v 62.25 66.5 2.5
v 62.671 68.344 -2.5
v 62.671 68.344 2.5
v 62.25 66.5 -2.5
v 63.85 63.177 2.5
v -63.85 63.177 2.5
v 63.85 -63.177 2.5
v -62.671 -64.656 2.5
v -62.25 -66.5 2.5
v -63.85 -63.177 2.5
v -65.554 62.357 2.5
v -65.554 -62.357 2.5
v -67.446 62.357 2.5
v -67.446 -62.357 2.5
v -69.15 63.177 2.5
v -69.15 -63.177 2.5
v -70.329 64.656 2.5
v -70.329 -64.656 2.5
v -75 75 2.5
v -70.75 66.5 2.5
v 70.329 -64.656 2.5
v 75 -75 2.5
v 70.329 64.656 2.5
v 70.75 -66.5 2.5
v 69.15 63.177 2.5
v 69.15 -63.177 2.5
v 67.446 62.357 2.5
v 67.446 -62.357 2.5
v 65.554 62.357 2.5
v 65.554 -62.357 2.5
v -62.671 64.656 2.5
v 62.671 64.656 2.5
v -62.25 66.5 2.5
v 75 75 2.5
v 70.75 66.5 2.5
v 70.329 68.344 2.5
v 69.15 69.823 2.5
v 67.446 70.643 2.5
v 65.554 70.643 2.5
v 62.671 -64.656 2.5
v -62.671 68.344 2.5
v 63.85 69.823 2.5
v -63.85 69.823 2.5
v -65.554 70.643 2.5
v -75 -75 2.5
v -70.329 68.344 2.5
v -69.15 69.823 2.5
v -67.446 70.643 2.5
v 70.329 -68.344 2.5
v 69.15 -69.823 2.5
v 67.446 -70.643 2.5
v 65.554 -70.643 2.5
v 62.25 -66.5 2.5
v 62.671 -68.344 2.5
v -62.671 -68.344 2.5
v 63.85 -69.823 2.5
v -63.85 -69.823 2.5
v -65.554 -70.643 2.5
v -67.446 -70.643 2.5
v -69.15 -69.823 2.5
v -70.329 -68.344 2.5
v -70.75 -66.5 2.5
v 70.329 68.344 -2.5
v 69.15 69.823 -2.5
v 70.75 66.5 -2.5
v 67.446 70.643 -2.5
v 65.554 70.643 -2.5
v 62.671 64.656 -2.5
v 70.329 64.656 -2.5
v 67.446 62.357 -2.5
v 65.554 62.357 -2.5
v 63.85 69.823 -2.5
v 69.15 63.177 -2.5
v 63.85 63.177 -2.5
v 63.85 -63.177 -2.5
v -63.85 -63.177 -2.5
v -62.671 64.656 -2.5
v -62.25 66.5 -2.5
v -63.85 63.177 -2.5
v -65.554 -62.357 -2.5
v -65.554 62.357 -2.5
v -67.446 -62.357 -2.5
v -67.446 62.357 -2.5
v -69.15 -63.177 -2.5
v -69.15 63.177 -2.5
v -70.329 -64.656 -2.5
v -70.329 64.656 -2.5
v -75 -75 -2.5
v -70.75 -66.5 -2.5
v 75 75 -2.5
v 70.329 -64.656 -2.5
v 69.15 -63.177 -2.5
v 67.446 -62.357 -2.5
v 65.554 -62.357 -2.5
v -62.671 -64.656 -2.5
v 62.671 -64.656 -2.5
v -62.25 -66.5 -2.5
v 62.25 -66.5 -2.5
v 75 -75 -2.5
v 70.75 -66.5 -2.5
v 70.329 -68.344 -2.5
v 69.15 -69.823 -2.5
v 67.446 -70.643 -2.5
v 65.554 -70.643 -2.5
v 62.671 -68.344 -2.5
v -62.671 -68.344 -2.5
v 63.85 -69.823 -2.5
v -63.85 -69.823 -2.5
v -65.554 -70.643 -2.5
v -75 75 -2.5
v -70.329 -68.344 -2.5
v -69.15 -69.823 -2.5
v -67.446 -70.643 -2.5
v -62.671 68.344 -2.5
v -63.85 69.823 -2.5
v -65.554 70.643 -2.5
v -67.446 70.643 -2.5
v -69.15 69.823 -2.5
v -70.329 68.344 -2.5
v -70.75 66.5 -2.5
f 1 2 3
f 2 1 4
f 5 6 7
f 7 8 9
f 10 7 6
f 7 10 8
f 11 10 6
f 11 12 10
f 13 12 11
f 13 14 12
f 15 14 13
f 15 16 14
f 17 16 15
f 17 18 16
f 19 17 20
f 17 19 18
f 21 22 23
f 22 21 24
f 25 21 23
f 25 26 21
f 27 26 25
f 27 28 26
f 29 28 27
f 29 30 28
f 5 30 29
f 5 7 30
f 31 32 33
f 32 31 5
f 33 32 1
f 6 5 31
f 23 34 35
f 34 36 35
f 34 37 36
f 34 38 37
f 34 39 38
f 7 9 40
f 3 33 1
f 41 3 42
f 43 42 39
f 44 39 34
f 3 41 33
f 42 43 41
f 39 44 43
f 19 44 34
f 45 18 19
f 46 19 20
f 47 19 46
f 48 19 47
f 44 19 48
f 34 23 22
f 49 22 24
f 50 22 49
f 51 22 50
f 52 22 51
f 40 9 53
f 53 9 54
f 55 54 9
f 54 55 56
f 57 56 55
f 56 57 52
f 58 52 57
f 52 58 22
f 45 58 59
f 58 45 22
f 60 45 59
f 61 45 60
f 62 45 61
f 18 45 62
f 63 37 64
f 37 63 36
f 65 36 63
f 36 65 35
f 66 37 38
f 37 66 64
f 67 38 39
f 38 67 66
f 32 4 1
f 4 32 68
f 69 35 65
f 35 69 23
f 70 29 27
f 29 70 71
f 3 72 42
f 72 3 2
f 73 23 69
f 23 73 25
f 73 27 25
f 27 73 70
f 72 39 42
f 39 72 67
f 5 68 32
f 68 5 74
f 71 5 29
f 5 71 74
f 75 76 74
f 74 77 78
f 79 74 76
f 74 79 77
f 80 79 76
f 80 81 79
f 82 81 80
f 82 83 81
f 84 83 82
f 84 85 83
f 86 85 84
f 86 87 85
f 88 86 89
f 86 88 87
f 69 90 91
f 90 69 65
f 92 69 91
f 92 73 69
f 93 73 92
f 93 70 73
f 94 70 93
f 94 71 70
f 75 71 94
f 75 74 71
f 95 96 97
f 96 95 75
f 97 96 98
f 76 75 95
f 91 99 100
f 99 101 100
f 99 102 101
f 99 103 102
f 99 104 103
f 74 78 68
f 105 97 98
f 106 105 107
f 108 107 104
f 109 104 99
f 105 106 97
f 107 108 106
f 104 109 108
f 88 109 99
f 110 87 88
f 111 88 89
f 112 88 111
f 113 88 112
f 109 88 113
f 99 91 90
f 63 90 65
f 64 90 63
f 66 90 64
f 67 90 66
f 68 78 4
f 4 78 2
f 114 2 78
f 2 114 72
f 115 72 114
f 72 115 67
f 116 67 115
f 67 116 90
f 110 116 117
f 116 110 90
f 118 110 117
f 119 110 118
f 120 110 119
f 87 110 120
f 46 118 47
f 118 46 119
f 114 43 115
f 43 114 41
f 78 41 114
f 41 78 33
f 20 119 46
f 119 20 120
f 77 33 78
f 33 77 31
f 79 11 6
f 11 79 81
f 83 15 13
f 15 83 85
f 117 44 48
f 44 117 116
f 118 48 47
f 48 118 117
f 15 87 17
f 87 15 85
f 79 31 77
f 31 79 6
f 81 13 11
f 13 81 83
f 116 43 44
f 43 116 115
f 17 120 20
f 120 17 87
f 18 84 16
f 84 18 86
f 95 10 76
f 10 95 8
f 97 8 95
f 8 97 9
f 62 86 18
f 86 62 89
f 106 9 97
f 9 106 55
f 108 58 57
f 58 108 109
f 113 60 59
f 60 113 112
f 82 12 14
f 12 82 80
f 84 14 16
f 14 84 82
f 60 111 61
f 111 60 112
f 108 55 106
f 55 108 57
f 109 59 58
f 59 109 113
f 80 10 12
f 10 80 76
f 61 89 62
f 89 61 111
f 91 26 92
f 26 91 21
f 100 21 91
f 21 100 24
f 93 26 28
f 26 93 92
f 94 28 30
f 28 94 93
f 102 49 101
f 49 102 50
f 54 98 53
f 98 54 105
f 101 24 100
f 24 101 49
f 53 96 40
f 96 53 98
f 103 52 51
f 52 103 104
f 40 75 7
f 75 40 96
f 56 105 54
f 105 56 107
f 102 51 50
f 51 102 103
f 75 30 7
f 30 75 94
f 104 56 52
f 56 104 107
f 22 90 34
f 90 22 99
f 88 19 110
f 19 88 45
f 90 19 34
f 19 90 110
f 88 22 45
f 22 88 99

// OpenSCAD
// Generated by SolidPython 1.1.3 on 2023-10-16 11:53:18


difference() {
	cube(center = true, size = [150, 150, 5]);
	union() {
		translate(v = [66.5000000000, 66.5000000000]) {
			cylinder(center = true, h = 5, r = 4.2500000000);
		}
		translate(v = [-66.5000000000, 66.5000000000]) {
			cylinder(center = true, h = 5, r = 4.2500000000);
		}
		translate(v = [-66.5000000000, -66.5000000000]) {
			cylinder(center = true, h = 5, r = 4.2500000000);
		}
		translate(v = [66.5000000000, -66.5000000000]) {
			cylinder(center = true, h = 5, r = 4.2500000000);
		}
	}
}
/***********************************************
*********      SolidPython code:      **********
************************************************
 
import solid
import numbers
import pudb
from solid.utils import *
import viewscad
import subprocess
import os
import os.path as osp
import math
import sys

chamfer_extrude=solid.import_scad("./chamfer_extrude.scad")
chamfer_extrude=chamfer_extrude.chamfer_extrude
r = viewscad.Renderer(width=800, height=800)

def debug(model,f_name,path="/home/ts/code/projects/mfd/designs/debug"):
    solid.scad_render_to_file(model,osp.join(path,f_name)+".scad")
#generate position list of wells using offset from center
wells_pos_from_center_4 = lambda offset: [[-offset,offset],
                                        [offset, offset],
                                        [-offset, -offset],
                                        [offset, -offset]]
#wells_pos_from_center_2 = lambda offset: [[0,offset],
#                                        [0, -offset]]
wells_pos_from_center_2 = lambda offset: [[offset,0],
                                        [-offset,0]]

def make_well(dims,shape=None,height=None,dxf=False):
    def circle_cylinder():
        if dxf or (height is None):
            well = solid.circle(r=dims, segments=64)
        else:
            well = solid.cylinder(r=dims, h=height, segments=64, center = True)
        return well
    if dims is None:
        sys.exit("radius needs to be a number")
    if isinstance(dims, numbers.Number):
        well =circle_cylinder()
    elif len(dims)==1:
        if isinstance(dims[1], numbers.Number):
            well =circle_cylinder()
        else:
            sys.exit("radius needs to be a number")
    elif len(dims)==2:
        well = solid.square(dims,center = True)
    elif len(dims)==3:
        well = solid.cube(dims, center = True)
    return well

def wells_top_bottom(center_gap,device_dims=None,shape=None,height=None, positions = None, dxf = False):
    well_shape = make_well(device_dims,shape=shape,height=height,dxf=dxf)
    wells = []
    if positions is None:
        offset = radius+radius/2.0
        positions = wells_pos_from_center_2(offset)
    if dxf or (height is None):
        height = 0
    for position in positions:
        if dxf:
            wells.append(solid.translate([position[0],position[1]])(well_shape))
        else:
            wells.append(solid.translate([position[0],position[1],height/2.0])(well_shape))
    return  union()(*wells)

#place wells in four corners 
def four_corner(radius,height=None, positions = None, dxf = False):
    #if well pos not specified set
    #to equally spaced by half radius
    if positions is None:
        offset = radius+radius/2.0
        positions = wells_pos_from_center_4(offset)
    if dxf or (height is None):
        height = 0
    #make wells at positions with specified radius and height
    wells = []
    for position in positions:
        #make circle if making dxf
        if dxf:
            well_shape = solid.circle(r=radius, segments=64)
            well_shape = solid.translate([position[0],position[1]])(well_shape)
        #if stl make cylinder
        else:
            well_shape = solid.cylinder(r=radius, h=height, segments=64, center = True)
            well_shape = solid.translate([position[0],position[1],height/2.0])(well_shape)
        wells.append(well_shape)
    return  union()(*wells)

#generate channels 
def make_channels(length,width,height=0,num_chans=1,max_chans=None,spacing=None, dxf = False,
                  rotate_channels=False):
    if dxf or (height is None):
        height = 0
    #if channel gap not defined, is equal to
    if spacing is None: spacing = width
    #calculate number of channels if fitting max num within given width
    if not max_chans is None:
        import math
        num_chans = math.floor((max_chans-spacing)/(width+spacing))
    #get total width of channel section  
    total_width = (width*num_chans)+(spacing*(num_chans-1))

    #make template channel
    #if rotate_channels: width, length = length, width
    if dxf:
        channel_t = solid.square([length,width],center = True)
    else:
        channel_t = solid.cube([length,width,height], center = True)

    #if number channels is even, offset the first channel to center its gap
    if num_chans % 2 == 0: centering = -(width/2.0+spacing/2.0)
    else: centering = 0
    #move template channel up to align bottom at z = 0 
    #and offset center if necessary
    if dxf:
        channel_t = solid.translate([0,centering])(channel_t)
    else:
        channel_t = solid.translate([0,centering,height/2.0])(channel_t)

    #if rotate_channels: length,width = width,length
    #start making the channels
    channels = []
    for i in range(num_chans):
        #if i=0 there is no translation
        #if i=1, we make the first channel adjacent to second
        direction = i

        #if i>=1, we add channels alternating left and right
        if i >= 1:
            direction = -(i/2.0)
            if i % 2 == 1: direction = (-direction)+0.5
                
        #make channel at right position and add it to channel list
        translation_coords = [0,direction*(width+spacing)]
        #if rotate_channels: translation_coords = [direction*(width+spacing),0]
        if dxf:
            channel = solid.translate(translation_coords)(channel_t)
        else:
            channel = solid.translate([*translation_coords,0])(channel_t)
        channels.append(channel)
    
    #group all channels as one object
    channels = union()(*channels)
    #compute the x,y,z dimensions in order to pass as arguments 
    #for construction of other parts of device (such as the chambers)
    measurements = {'x':(length/2.0,-length/2.0),
                    'y':(total_width/2.0,-total_width/2.0)}
    if not dxf:
        measurements['z'] = (height,0)
    if rotate_channels:
        channels = solid.rotate(90)(channels)
        measurements['x'],measurements['y']=measurements['y'],measurements['x']
    return channels,measurements

def make_chambers(msrs,height=None,extra=0,len_until=None,width=None, dxf = False):
    #computes x,y,z length
    total = lambda x : abs(x[0]) + abs(x[1])
    
    #if specific height if specified
    #otherwise use same height as channels
    if dxf:
        pass
    elif not height is None:
        msrs['z'] = (height,0)
    else:
        msrs['z'] = (0,0)
        
    #make copy of measurements from channels to modify chamber dimensions 
    #and add length to chambers as specified
    chamber_dims = msrs.copy()
    #calculate length of chamber to reach specified offset
    if not len_until is None:
        chamber_len = len_until-(msrs['x'][0])
    #or add specified length to channel length (if not specified, adds 0)
    else:
        chamber_len = msrs['x'][0]+extra
    #set the chamber length based 
    chamber_dims['x'] = (chamber_len/2.0,-(chamber_len/2.0))
    #compute final dimensions of chamber
    if not width is None:
        chamber_dims['y'] = (width/2.0,-width/2.0)
    chamber_dims = [total(size) for size in chamber_dims.values()]
        
    #calculate chamber translation offset to place adjacent to channels
    chamber_trslt = msrs['x'][0]+(chamber_len/2.0)
    #compute chamber translation coordinates to align with channels
    #x = 1 moves chamber above channels
    #x = -1 moves chamber below channels
    if dxf:
        trslt = lambda x : [x*(chamber_trslt),0]
    else:
        trslt = lambda x : [x*(chamber_trslt),0,msrs['z'][0]/2.0]
    
    #function to make chamber at top or at bottom 
    if dxf:
        move = lambda x : solid.translate(trslt(x))(solid.square(chamber_dims, center = True) )
    else:
        move = lambda x : solid.translate(trslt(x))(solid.cube(chamber_dims,center = True))
    #make top and bottom chambers and return them as grouped
    top = move(1)
    bottom = move(-1)
    #chambers=solid.rotate(90)(solid.union()(top,bottom))
    chambers=(solid.union()(top,bottom))

    return chambers

#create alignment features 
def alignment_features(unit,dims,grid_size, mask_size = None, alignment = "hollow", units_from_center = (2.5,2.5), corner_len=None):
    width = grid_size[0]*dims[0]
    length = grid_size[1]*dims[1]
    if mask_size is None and corner_len is None:
        corner_len = (dims[0] + dims[1]) /2 / 8
    corner = lambda thickness_div : solid.union()( solid.square([corner_len,corner_len/thickness_div],center=False), solid.square([corner_len/thickness_div,corner_len],center=False) )
    
    def make_full(thickness_div):
        thickness = corner_len/thickness_div
        tr = solid.translate([0, 0, 0 ])(solid.rotate(180)(corner(thickness_div)))
        tr = solid.translate([thickness/2,thickness/2,0])(tr)
        bl = solid.translate([0, 0, 0 ])(solid.rotate(0)(corner(thickness_div)))
        bl = solid.translate([-thickness/2,-thickness/2,0])(bl)
        return solid.union()(tr,bl)
    
    def make_hollow(thickness_div):
        thickness = corner_len/(thickness_div/2)
        inner = make_full(thickness_div)
        outer = make_full(thickness_div/2)
        hollow = outer - inner 
        return hollow
    
    center = (width /2 , length/2)
    mask_pos = lambda x,y : (center[0] + x*(float(units_from_center[0])*dims[0]), center[1] + y*(float(units_from_center[1])*dims[1]))
    positions = []
    positions.append(mask_pos(1,0))
    positions.append(mask_pos(0,1))
    positions.append(mask_pos(-1,0))
    positions.append(mask_pos(0,-1))
    make_mask = lambda mtype : make_hollow(8) if mtype == "hollow" else make_full(8)
    masks = [ solid.translate([*position,0])(make_mask(alignment)) for position in positions]
    
    solid.scad_render_to_file(solid.union()(*masks),"./designs/open_chamber/masks.scad")
    #return unit - solid.union()(*masks)
    return solid.union()(*masks,unit)

def create_outline(thickness, array, dims, grid_size,):
    width = grid_size[0]*dims[0] + thickness *2
    length = grid_size[1]*dims[1] + thickness *2
    outer = solid.translate([-thickness, -thickness,0])(solid.square([width, length]))
    return outer-array

def create_wall(wall_thickness, outline_thickness, dims, grid_size, wall_height = 2000, dxf = False):
    inner_width = grid_size[0]*dims[0] + outline_thickness *2
    inner_length = grid_size[1]*dims[1] + outline_thickness *2
    outer_width = inner_width + wall_thickness * 2
    outer_length = inner_length + wall_thickness * 2
    outer_pos_x = -outline_thickness-wall_thickness
    outer_pos_y = -outline_thickness-wall_thickness
    inner_pos_x = -outline_thickness
    inner_pos_y = -outline_thickness
    if dxf:
        inner_wall = solid.translate([inner_pos_x,
                                      inner_pos_y,
                                      0])(solid.square([inner_width, inner_length]))
        outer_wall = solid.translate([outer_pos_x,
                                      outer_pos_y,
                                      0])(solid.square([outer_width, outer_length]))

        return outer_wall-inner_wall
    else:
        inner_wall = solid.translate([inner_pos_x,
                                      inner_pos_y,
                                      0])(solid.cube([inner_width, inner_length,wall_height]))
        outer_wall = solid.translate([outer_pos_x,
                                      outer_pos_y,
                                      0])(solid.cube([outer_width, outer_length,wall_height]))

        return outer_wall-inner_wall, {'wall_height': wall_height,
                                       'wall_thickness': wall_thickness,
                                       'inner_width':inner_width,
                                       'inner_length': inner_length,
                                       'outer_width': outer_width,
                                       'outer_length': outer_length,
                                       'outer_pos_x' : outer_pos_x,
                                       'outer_pos_y' : outer_pos_y,
                                       'inner_pos_x' : inner_pos_x,
                                       'inner_pos_y' : inner_pos_y}

def create_thicker_wall(wall_thickness, outer_wall_offset, wall_dims, dims, grid_size, height_start = .2, height_end=2, dxf = False):
    addon_wall,thicker_wall_dims = create_wall(wall_thickness, outer_wall_offset, dims, grid_size, wall_height=height_end-height_start, dxf = False)
    addon_wall = solid.translate([0,0,height_start])(addon_wall)

    thicker_wall_dims['wall_height'] = height_end
    thicker_wall_dims['wall_thickness'] = wall_dims['wall_thickness'] + wall_thickness
    return addon_wall, thicker_wall_dims
 
def add_lock_to_wall(wall,wall_dims,y_offset = 0,cut_ratio=0.7,L_length=3, gap_ratio=0.05, axis="x",width_ratio=1/2):
    # Makes L shape
    def make_L(max_length,length_thickness,max_width,width_thickness,height,y_offset):
        length = solid.cube([max_length,length_thickness,height])
        width = solid.cube([width_thickness,max_width,height])
        width = solid.translate([max_length-(width_thickness),0,0])(width)
        L = solid.union()(width,length)
        debug(L,"L")
        if axis == "x":
            L = solid.rotate(-90)(L)
            L = solid.translate([0,max_length,0])(L)
        else:
            L = solid.rotate(-180)(L)
            L = solid.translate([max_length,max_width,0])(L)
        return solid.translate([0,0,y_offset])(L)
    
    lock_length = L_length
    lock_width = wall_dims['wall_thickness']*width_ratio
    lock_length_thickness = lock_width/2
    lock_width_thickness = lock_width/2
    L_lock = make_L(lock_length,lock_length_thickness,lock_width,lock_width_thickness, wall_dims['wall_height']-y_offset, y_offset)
    
    margin_space = lock_length - lock_length*(1-gap_ratio)
    key_length = lock_length-margin_space
    key_length_thickness = lock_length_thickness-(margin_space*2)
    key_width = lock_width-(margin_space*2)
    key_width_thickness = lock_width_thickness-(margin_space*2)
    L_key = make_L(key_length,key_length_thickness,key_width,key_width_thickness, wall_dims['wall_height']-y_offset, y_offset)
    L_key = solid.translate([margin_space,margin_space,0])(L_key)
    L = solid.union()(L_lock,L_key)
    debug(L,"L")
    
    #Make cube to be used as negative to split frame in a half
    #Can choose if making left or right negative, specify ratio of split
    def make_negative(right,cut_ratio):
        if axis == "x":
            if right:
                length = wall_dims['outer_length']*(1-cut_ratio)
                pos_x = wall_dims['outer_pos_x']+(wall_dims['outer_length']*cut_ratio)
            else:
                length = wall_dims['outer_length']*(cut_ratio)
                pos_x = wall_dims['outer_pos_x'] 
            negative = solid.cube([wall_dims['outer_width'],length, wall_dims['wall_height']])
            negative = solid.translate([wall_dims['outer_pos_y'],pos_x,0])(negative)
        else:
            if right:
                length = wall_dims['outer_width']*(1-cut_ratio)
                pos_x = wall_dims['outer_pos_y']+(wall_dims['outer_width']*cut_ratio)
            else:
                length = wall_dims['outer_width']*(cut_ratio)
                pos_x = wall_dims['outer_pos_y'] 
            negative = solid.cube([length,wall_dims['outer_length'], wall_dims['wall_height']])
            negative = solid.translate([pos_x,wall_dims['outer_pos_x'],0])(negative)
        return negative, pos_x, length 
                      
    #Make negatives
    negative_right, right_half_pos_x, right_half_length = make_negative(True,cut_ratio)
    negative_left, left_half_pos_x, right_half_length = make_negative(False,cut_ratio)
    #Make halves
    left_half = solid.difference()(wall,negative_right)
    right_half = solid.difference()(wall,negative_left)
    def place_L(L, L_length,L_width):
        #Place L on top wall       
        offset_to_center = (wall_dims['wall_thickness']-L_width)/2
        if axis == "x":
            y_pos_top = (wall_dims['outer_pos_y'] +
                    wall_dims['outer_width'] - 
                    L_width - offset_to_center)
            top_L = solid.translate([y_pos_top,
                                     right_half_pos_x-(L_length),
                                     0])(L)
            #Place L on bottom wall       
            y_pos_bottom = wall_dims['outer_pos_y']+offset_to_center
            bottom_L = solid.translate([y_pos_bottom,
                                        right_half_pos_x-L_length,
                                        0])(L)
        else:
            y_pos_top = (wall_dims['outer_pos_x'] +
                    wall_dims['outer_length'] -
                    (L_width+offset_to_center))
            top_L = solid.translate([right_half_pos_x-L_length,
                                     y_pos_top,
                                     0])(L)
            #Place L on bottom wall       
            y_pos_bottom = wall_dims['outer_pos_y']+offset_to_center
            bottom_L = solid.translate([right_half_pos_x-L_length,
                                        y_pos_bottom,
                                        0])(L)
        return bottom_L, top_L
    #Make complimentary L pieces through union and differences
    #Make Lock
    bottom_L_lock, top_L_lock = place_L(L_lock,L_length,lock_width)
    left_half = solid.difference()(left_half,bottom_L_lock)
    left_half = solid.difference()(left_half,top_L_lock)
    #Make Key
    bottom_L_key, top_L_key = place_L(L_key,L_length,lock_width)
    right_half = solid.union()(right_half,bottom_L_key)
    right_half = solid.union()(right_half,top_L_key)
    return left_half, right_half


#build a row x col grid of containment units
def make_unit_array(unit,dims,grid_size, dxf = False, alignment = None, mask_size = None,
                    units_from_center = None,alignment_offset=None, alignment_mark_size=1):
    units = []
    for col in range(grid_size[1]):
        for row in range(grid_size[0]):
            if dxf:
                units.append(solid.translate([row*dims[0],col*dims[1]])(unit))
            else:
                units.append(solid.translate([row*dims[0],col*dims[1],dims[2]/2.0])(unit))
    array = solid.union()(*units)
    if (not alignment is None) and dxf:
        if not alignment_offset is None:
            array = solid.translate([alignment_offset[0],alignment_offset[1]])(array)
        array = alignment_features(array,dims, grid_size, alignment = alignment, mask_size = None, units_from_center = units_from_center,corner_len=alignment_mark_size)
        if not alignment_offset is None:
            array = solid.translate([-alignment_offset[0],-alignment_offset[1]])(array)
    return array


def make_taylor(wells_pos = wells_pos_from_center_4(2.25), well_rad = 1.5 ,
                well_height = 2, chan_w = 0.01, chan_l = 1, chan_h = 0.010 ,
                chan_gap = 0.040, max_chans = None,num_chans=100, chamber_height  = 0.100,
                columns = 1, rows = 1, chamber_len_until=2.25, add_channels = True, add_wells = True, 
                add_chambers = True, save_path = "./", alignment = None, units_from_center = 2,
                mask_size = None, render_stl = False, outline_thickness = 0.050, dxf = True,
                wall_height = 15, wall_thickness = 0.95, casing_x=9, casing_y=9, casing_z=0,rotate_units=0):

    dims = [casing_x, casing_y, casing_z]
    wells = four_corner(well_rad,well_height, dxf = dxf, positions = wells_pos)
    debug(wells,"wells")
    channels, msrs = make_channels(chan_l,chan_w,chan_h,dxf=dxf, spacing = chan_gap, max_chans=max_chans,num_chans=num_chans)
    debug(channels,"channels")
    chambers = make_chambers(msrs,dxf = dxf, height=chamber_height,len_until=chamber_len_until)
    debug(chambers,"chambers")

    #add together and render
    device_parts = []
    if add_channels:
        device_parts.append(channels)
    if add_wells:
        device_parts.append(wells)
    if add_chambers:
        device_parts.append(chambers)
    device=union()(*device_parts)
    device = rotate(rotate_units)(device)

    device=solid.translate([dims[0]/2.0,dims[1]/2.0,0])(device)
    channels = rotate(rotate_units)(channels)
    channels=solid.translate([dims[0]/2,dims[1]/2,0])(channels)
    chambers_wells = union()(wells,chambers)
    chambers_wells = rotate(rotate_units)(chambers_wells)
    chambers_wells=solid.translate([dims[0]/2,dims[1]/2,0])(chambers_wells)

    file_name = str(rows)+'x'+str(columns)+'_units_'
    grid_size = [rows,columns]

    if alignment:
        alignment="full"
    device = make_unit_array(device,dims,grid_size, dxf=dxf, alignment = alignment,
                                 units_from_center = units_from_center)
    channels = make_unit_array(channels,dims,grid_size, dxf=dxf, alignment = alignment,
                                 units_from_center = units_from_center)
    if alignment=="full":
        alignment="hollow"

    chambers_wells = make_unit_array(chambers_wells,dims,grid_size, dxf=dxf, alignment = alignment,
                                 units_from_center =units_from_center)

    def save_model(model,prefix):
        model_fname = os.path.abspath(save_path+prefix+"_"+file_name+".scad")
        solid.scad_render_to_file(model,model_fname)
        return model_fname

    wells_fname = save_model(wells,"wells")
    channels_fname = save_model(channels,"channels")
    device_fname = save_model(device,"device")
    chambers_wells_fname = save_model(chambers_wells,"chambers_wells")
    return (chambers_wells,chambers_wells_fname), (channels,channels_fname), (device,device_fname)

def make_device(design='open',rows=8,columns=6,wells_pos = 4.5,well_offset=3.2, well_rad=3.2,well_height=0.1,
                chan_l=1,chan_w=0.01,chan_h=0.01,chan_gap=0.015,num_chans=101,dxf=True,save_path="./designs/open_chamber/",
                casing_x=9.0,casing_y=18.0,casing_z=0,rotate_units=90,units_from_center=(3,1),chamber_len_until=4.5,
                chamber_width=None,alignment=True, add_wells=True, add_channels=True,add_chambers=True):

    dims = [casing_x, casing_y, casing_z]
    if design == "open":
        wells_pos=wells_pos_from_center_2(wells_pos)
        wells = wells_top_bottom(well_offset*2,device_dims=well_rad,height=well_height, dxf = dxf, positions = wells_pos)
    elif design == "closed":
        wells_pos=wells_pos_from_center_4(wells_pos)
        debug(wells,"wells")
        wells = four_corner(well_offset,well_heightdevice_dims=well_rad, dxf = dxf, positions = wells_pos)
    else:
        print(design+" is not a valid design.\n Choose valid design: 'open' or 'closed'")
        exit()
    wells = rotate(rotate_units)(wells)
    wells=solid.translate([dims[0]/2,dims[1]/2,0])(wells)
    debug(wells,"wells")

    channels, msrs = make_channels(chan_l,chan_w,chan_h,dxf=dxf, spacing = chan_gap, num_chans=num_chans,rotate_channels=False)
    channels = rotate(rotate_units)(channels)
    channels=solid.translate([dims[0]/2,dims[1]/2,0])(channels)

    chambers=make_chambers(msrs,height=None,extra=0,len_until=chamber_len_until, width=chamber_width,dxf = dxf)
    chambers = rotate(rotate_units)(chambers)
    chambers=solid.translate([dims[0]/2,dims[1]/2,0])(chambers)

    device_parts = []
    if add_channels:
        device_parts.append(channels)
    if add_wells:
        device_parts.append(wells)
    if add_chambers:
        device_parts.append(chambers)
    device = union()(*device_parts)
    #device = rotate(rotate_units)(device)
    #device=solid.translate([dims[0]/2.0,dims[1]/2.0,0])(device)

    chambers_wells = []
    if add_chambers:
        chambers_wells.append(chambers)
    if add_wells:
        chambers_wells.append(wells)
    chambers_wells = union()(*chambers_wells)
    #chambers_wells = union()(wells,chambers)
    #chambers_wells = rotate(rotate_units)(chambers_wells)
    #chambers_wells=solid.translate([dims[0]/2,dims[1]/2,0])(chambers_wells)

    file_name = str(rows)+'x'+str(columns)+'_units_'

    grid_size = [rows,columns]
    if alignment:
        alignment="full"
    device = make_unit_array(device,dims,grid_size, dxf=dxf, alignment = alignment,
                                 units_from_center = units_from_center)
    channels = make_unit_array(channels,dims,grid_size, dxf=dxf, alignment = alignment,
                                 units_from_center = units_from_center)
    if alignment=="full":
        alignment="hollow"

    chambers_wells = make_unit_array(chambers_wells,dims,grid_size, dxf=dxf, alignment = alignment,
                                 units_from_center =units_from_center)

    def save_model(model,prefix):
        model_fname = os.path.abspath(save_path+prefix+"_"+file_name+".scad")
        solid.scad_render_to_file(model,model_fname)
        return model_fname

    wells_fname = save_model(wells,"wells")
    channels_fname = save_model(channels,"channels")
    device_fname = save_model(device,"device")
    chambers_wells_fname = save_model(chambers_wells,"chambers_wells")
    return (chambers_wells,chambers_wells_fname), (channels,channels_fname), (device,device_fname)


def make_open_chamber(rows=8,columns=6,wells_pos = wells_pos_from_center_2(4.5), well_rad=3.2,well_height=0.1,
                      chan_l=1,chan_w=0.01,chan_h=0.01,chan_gap=0.015,num_chans=101,dxf=True,save_path="./designs/open_chamber/",
                      casing_x=9.0,casing_y=18.0,casing_z=0,rotate_units=90,units_from_center=(3,1),chamber_len_until=4.5,
                      chamber_width=None,alignment=True, add_wells=True, add_channels=True,add_chambers=True):

    dims = [casing_x, casing_y, casing_z]
    wells = wells_top_bottom(well_rad,height=well_height, dxf = dxf, positions = wells_pos)
    channels, msrs = make_channels(chan_l,chan_w,chan_h,dxf=dxf, spacing = chan_gap, num_chans=num_chans,rotate_channels=False)
    chambers=make_chambers(msrs,height=None,extra=0,len_until=chamber_len_until, width=chamber_width,dxf = dxf)
    debug(chambers,"chambers")
    device_parts = []
    if add_channels:
        device_parts.append(channels)
    if add_wells:
        device_parts.append(wells)
    if add_chambers:
        device_parts.append(chambers)
    device = union()(*device_parts)
    device = rotate(rotate_units)(device)
    device=solid.translate([dims[0]/2.0,dims[1]/2.0,0])(device)
    channels = rotate(rotate_units)(channels)
    channels=solid.translate([dims[0]/2,dims[1]/2,0])(channels)
    chambers_wells = union()(wells,chambers)
    chambers_wells = rotate(rotate_units)(chambers_wells)
    chambers_wells=solid.translate([dims[0]/2,dims[1]/2,0])(chambers_wells)

    file_name = str(rows)+'x'+str(columns)+'_units_'

    grid_size = [rows,columns]
    if alignment:
        alignment="full"
    device = make_unit_array(device,dims,grid_size, dxf=dxf, alignment = alignment,
                                 units_from_center = units_from_center)
    channels = make_unit_array(channels,dims,grid_size, dxf=dxf, alignment = alignment,
                                 units_from_center = units_from_center)
    if alignment=="full":
        alignment="hollow"

    chambers_wells = make_unit_array(chambers_wells,dims,grid_size, dxf=dxf, alignment = alignment,
                                 units_from_center =units_from_center)

    def save_model(model,prefix):
        model_fname = os.path.abspath(save_path+prefix+"_"+file_name+".scad")
        solid.scad_render_to_file(model,model_fname)
        return model_fname

    wells_fname = save_model(wells,"wells")
    channels_fname = save_model(channels,"channels")
    device_fname = save_model(device,"device")
    chambers_wells_fname = save_model(chambers_wells,"chambers_wells")
    return (chambers_wells,chambers_wells_fname), (channels,channels_fname), (device,device_fname)

def to_dxf(scad_path):
    dxf_path = scad_path.replace(".scad",".dxf")
    subprocess.call(["openscad", "-o", dxf_path, scad_path])
    import ezdxf
    temp_dxf = ezdxf.readfile(dxf_path)
    temp_dxf.saveas(dxf_path)

#def make_walls(diameter,thickness,grid_size,dims,height=20,segments=256,make_inner=True):
#    wafer_wall_out = solid.cylinder(r=diameter/2,h=height, segments=segments)
#    wafer_wall_in = solid.cylinder(r=(diameter/2-thickness),h=height, segments=segments)
#    wafer_wall = solid.difference()(wafer_wall_out,wafer_wall_in)
#    wafer_wall = solid.translate([grid_size[1]*dims[1]/2.0,grid_size[0]*dims[0]/2.0])(wafer_wall)
#
#    vertical_wall_length = grid_size[1]*dims[1]
#    horizontal_wall_length = grid_size[0]*dims[0]
#    vertical_wall = solid.cube([vertical_wall_length,thickness,height],center = True)
#    vertical_wall = solid.translate([vertical_wall_length/2,0,height/2])(vertical_wall)
#    horizontal_wall = solid.cube([thickness,horizontal_wall_length,height],center = True)
#    horizontal_wall = solid.translate([0,vertical_wall_length/2,height/2])(horizontal_wall)
#    walls = []
#    walls.append(horizontal_wall)
#    walls.append(vertical_wall)
#    for col in range(grid_size[1]):
#        if col == grid_size[1]-1: 
#            walls.append(solid.translate([0,(col+1)*dims[1]])(vertical_wall))
#        elif col > 0 and col < grid_size[1]-1 and make_inner==True:
#            walls.append(solid.translate([0,(col+1)*dims[1]])(vertical_wall))
#    for row in range(grid_size[0]):
#        if row == grid_size[0]-1: 
#            walls.append(solid.translate([(row+1)*dims[0],0])(horizontal_wall))
#        elif row > 0 and row < grid_size[0]-1 and make_inner==True:
#            walls.append(solid.translate([(row+1)*dims[0],0])(horizontal_wall))
#    walls = union()(*walls)
#    wafer_walls = union()(walls,wafer_wall)
#    return walls,wafer_wall,wafer_walls

def make_walls(diameter,thickness,grid_size,dims,height=20,segments=256,make_inner=True,padx=0,pady=0):
    wafer_wall_out = solid.cylinder(r=diameter/2,h=height, segments=segments)
    wafer_wall_in = solid.cylinder(r=(diameter/2-thickness),h=height, segments=segments)
    wafer_wall = solid.difference()(wafer_wall_out,wafer_wall_in)
    wafer_wall = solid.translate([grid_size[1]*dims[1]/2.0,grid_size[0]*dims[0]/2.0])(wafer_wall)

    vertical_wall_length = grid_size[0]*dims[0]+padx
    horizontal_wall_length = grid_size[1]*dims[1]+pady
    vertical_wall = solid.cube([vertical_wall_length,thickness,height],center = True)
    vertical_wall = solid.translate([vertical_wall_length/2-pady/2,-padx/2,height/2])(vertical_wall)
    horizontal_wall = solid.cube([thickness,horizontal_wall_length,height],center = True)
    horizontal_wall = solid.translate([-pady/2,horizontal_wall_length/2-padx/2,height/2])(horizontal_wall)
    walls = []
    walls.append(horizontal_wall)
    walls.append(vertical_wall)
    for col in range(grid_size[1]):
        if col == grid_size[1]-1: 
            walls.append(solid.translate([0,(col+1)*dims[1]+pady])(vertical_wall))
        elif col > 0 and col < grid_size[1]-1 and make_inner==True:
            walls.append(solid.translate([0,(col+1)*dims[1]])(vertical_wall))
    for row in range(grid_size[0]):
        if row == grid_size[0]-1: 
            walls.append(solid.translate([(row+1)*dims[0]+padx,0])(horizontal_wall))
        elif row > 0 and row < grid_size[0]-1 and make_inner==True:
            walls.append(solid.translate([(row+1)*dims[0],0])(horizontal_wall))
    walls = union()(*walls)
    wafer_walls = union()(walls,wafer_wall)
    return walls,wafer_wall,wafer_walls

def save_model(model,base_path,base_name,dxf=True):
    if not os.path.exists(base_path):
        os.makedirs(base_path)
    dxf_path=osp.join(base_path,base_name+".scad")
    solid.scad_render_to_file(model,osp.join(dxf_path))
    if dxf:
        to_dxf(dxf_path)

def make_wafer(diameter,flat_len,thickness):
    wafer = solid.cylinder(r1=diameter/2,r2=diameter/2,h=thickness,segments=512,)()
    x_start_flat=(flat_len/2)
    y_start_flat = math.sqrt(((diameter/2)**2) - (x_start_flat**2) )
    height_delete_flat=diameter/2-y_start_flat
    flat_delete = solid.cube([flat_len,height_delete_flat,thickness],center=False)()
    flat_delete = solid.translate([-flat_len/2,y_start_flat,0])(flat_delete)
    wafer = solid.difference()(wafer,flat_delete)
    wafer = solid.rotate(90)(wafer)
    return wafer

def add_wafer_to_mask(wafer_size,flat_len,mask,grid_size,dims,wafer_line_thickness=0.1,outer_mask_thickness=5,alignment_offset=None):
    def make_wafer_mask(wafer_size,flat_len):
        wafer_mask = make_wafer(wafer_size,flat_len,1)
        wafer_mask = solid.projection()(wafer_mask)
        wafer_mask = solid.translate([grid_size[0]*dims[0]/2.0,grid_size[1]*dims[1]/2.0])(wafer_mask)
        if not alignment_offset is None:
            wafer_mask = solid.translate([-alignment_offset[0],-alignment_offset[1]])(wafer_mask)
        return wafer_mask

    inner_wafer_line_mask = make_wafer_mask(wafer_size-wafer_line_thickness/2,flat_len)
    outer_wafer_line_mask = make_wafer_mask(wafer_size+wafer_line_thickness/2,flat_len)
    outer_wafer_mask = make_wafer_mask(wafer_size+outer_mask_thickness,flat_len)
    outer_wafer_mask = solid.difference()(outer_wafer_mask,outer_wafer_line_mask)
    wafer_mask = solid.union()(outer_wafer_mask,inner_wafer_line_mask)

    return solid.difference()(wafer_mask,mask)

def make_posts(post_shape,post_height):
    posts = solid.linear_extrude(height=post_height)(post_shape)
    return posts

def make_wafer_empty(diameter,flat_len,thickness,margin,notch_len=20,notch_height=5,oversize=1.01):
    diameter*=oversize
    flat_len*=oversize
    wafer = make_wafer(diameter,flat_len,thickness)
    holder = solid.cylinder(r1=diameter/2+margin,r2=diameter/2+margin,h=thickness,segments=512)()
    holder = solid.difference()(holder,wafer)

    x_start_flat=(flat_len/2)
    y_start_flat = math.sqrt(((diameter/2)**2) - (x_start_flat**2) )
    height_delete_flat=diameter/2-y_start_flat
    notch = solid.cube([notch_len,notch_height,thickness],center=False)()
    notch = solid.translate([-notch_len/2,y_start_flat,0])(notch)
    notch = solid.rotate(90)(notch)
    return solid.difference()(holder,notch)

def wafer_print_calibration(diameter,thickness,height,z_offset):
    circles = []
    radii = []
    radii.append(diameter/2.0*0.8)
    radii.append(diameter/2.0*0.6)
    radii.append(diameter/2.0*0.4)
    radii.append(diameter/2.0*0.2)
    for radius in radii:
        inner = solid.cylinder(r1=radius-(thickness/2.0),r2=radius-(thickness/2.0),h=thickness,segments=512,)()
        outer = solid.cylinder(r1=radius+(thickness/2.0),r2=radius+(thickness/2.0),h=thickness,segments=512,)()
        diff = solid.difference()(outer,inner)
        circles.append(diff)
    circles = solid.union()(*circles)
    circles = solid.translate([0,0,z_offset])(circles)
    return circles

def make_rack(wells,dims,grid_size,alignment_offset,rack_x,rack_y,rack_thickness,bolt_width,add_bolts=True):

    #get X and Y dimensions of gride of pipette tips
    X_len = dims[0]*grid_size[0]
    Y_len = dims[1]*grid_size[1]
    #make rack
    rack = solid.cube([rack_x,rack_y,rack_thickness],center=True)

    if add_bolts:
    #add bolt holes
        bolt_hole=solid.cylinder(r=bolt_width/2,h=rack_thickness,center=True)()
        bolt_holes = []
        bolt_holes.append(solid.translate([rack_x/2-1.5*bolt_width,rack_y/2-1.5*bolt_width])(bolt_hole))
        bolt_holes.append(solid.translate([-rack_x/2+1.5*bolt_width,rack_y/2-1.5*bolt_width])(bolt_hole))
        bolt_holes.append(solid.translate([-rack_x/2+1.5*bolt_width,-rack_y/2+1.5*bolt_width])(bolt_hole))
        bolt_holes.append(solid.translate([rack_x/2-1.5*bolt_width,-rack_y/2+1.5*bolt_width])(bolt_hole))
        bolt_holes = solid.union()(*bolt_holes)
        rack=solid.difference()(rack,bolt_holes)
    rack_support = rack

    #center rack with pipette holes
    rack = solid.translate([0,0,rack_thickness/2])(rack)
    rack = solid.translate([X_len/2,Y_len/2])(rack)
    rack = solid.translate([-alignment_offset[0],-alignment_offset[1]])(rack)
    wells = solid.linear_extrude(height=rack_thickness)(wells)
    rack = solid.difference()(rack,wells)
    return rack, rack_support

def make_pillar(wells,dims,grid_size,alignment_offset,rack_x,rack_y,pillar_height,rack_thickness,bolt_width,add_bolts=True,taper_angle=1,bolt_position_corner=1.5):

    #get X and Y dimensions of gride of pipette tips
    X_len = dims[0]*grid_size[0]
    Y_len = dims[1]*grid_size[1]
    #make rack
    rack = solid.cube([rack_x,rack_y,rack_thickness],center=True)
    
    if add_bolts:
    #add bolt holes
        bolt_hole=solid.cylinder(r=bolt_width/2,h=rack_thickness,center=True)()
        bolt_holes = []
        bolt_holes.append(solid.translate([rack_x/2-bolt_position_corner*bolt_width,rack_y/2-bolt_position_corner*bolt_width])(bolt_hole))
        bolt_holes.append(solid.translate([-rack_x/2+bolt_position_corner*bolt_width,rack_y/2-bolt_position_corner*bolt_width])(bolt_hole))
        bolt_holes.append(solid.translate([-rack_x/2+bolt_position_corner*bolt_width,-rack_y/2+bolt_position_corner*bolt_width])(bolt_hole))
        bolt_holes.append(solid.translate([rack_x/2-bolt_position_corner*bolt_width,-rack_y/2+bolt_position_corner*bolt_width])(bolt_hole))
        bolt_holes = solid.union()(*bolt_holes)
        rack=solid.difference()(rack,bolt_holes)
    rack_support = rack

    #center rack with pipette holes
    #rack = solid.translate([0,0,-rack_thickness])(rack)
    rack = solid.translate([X_len/2,Y_len/2])(rack)
    rack = solid.translate([-alignment_offset[0],-alignment_offset[1]])(rack)
    if not taper_angle == 0:
        wells=chamfer_extrude(pillar_height,taper_angle,segments=20)(wells)
    else:
        wells = solid.linear_extrude(height=pillar_height)(wells)
    rack = solid.union()(rack,wells)
    return rack, rack_support

def deg_taper_len(height,deg):
    if not deg == 0:
        return height*math.tan(math.radians(deg))
    else:
        return 0









 
 
************************************************/
